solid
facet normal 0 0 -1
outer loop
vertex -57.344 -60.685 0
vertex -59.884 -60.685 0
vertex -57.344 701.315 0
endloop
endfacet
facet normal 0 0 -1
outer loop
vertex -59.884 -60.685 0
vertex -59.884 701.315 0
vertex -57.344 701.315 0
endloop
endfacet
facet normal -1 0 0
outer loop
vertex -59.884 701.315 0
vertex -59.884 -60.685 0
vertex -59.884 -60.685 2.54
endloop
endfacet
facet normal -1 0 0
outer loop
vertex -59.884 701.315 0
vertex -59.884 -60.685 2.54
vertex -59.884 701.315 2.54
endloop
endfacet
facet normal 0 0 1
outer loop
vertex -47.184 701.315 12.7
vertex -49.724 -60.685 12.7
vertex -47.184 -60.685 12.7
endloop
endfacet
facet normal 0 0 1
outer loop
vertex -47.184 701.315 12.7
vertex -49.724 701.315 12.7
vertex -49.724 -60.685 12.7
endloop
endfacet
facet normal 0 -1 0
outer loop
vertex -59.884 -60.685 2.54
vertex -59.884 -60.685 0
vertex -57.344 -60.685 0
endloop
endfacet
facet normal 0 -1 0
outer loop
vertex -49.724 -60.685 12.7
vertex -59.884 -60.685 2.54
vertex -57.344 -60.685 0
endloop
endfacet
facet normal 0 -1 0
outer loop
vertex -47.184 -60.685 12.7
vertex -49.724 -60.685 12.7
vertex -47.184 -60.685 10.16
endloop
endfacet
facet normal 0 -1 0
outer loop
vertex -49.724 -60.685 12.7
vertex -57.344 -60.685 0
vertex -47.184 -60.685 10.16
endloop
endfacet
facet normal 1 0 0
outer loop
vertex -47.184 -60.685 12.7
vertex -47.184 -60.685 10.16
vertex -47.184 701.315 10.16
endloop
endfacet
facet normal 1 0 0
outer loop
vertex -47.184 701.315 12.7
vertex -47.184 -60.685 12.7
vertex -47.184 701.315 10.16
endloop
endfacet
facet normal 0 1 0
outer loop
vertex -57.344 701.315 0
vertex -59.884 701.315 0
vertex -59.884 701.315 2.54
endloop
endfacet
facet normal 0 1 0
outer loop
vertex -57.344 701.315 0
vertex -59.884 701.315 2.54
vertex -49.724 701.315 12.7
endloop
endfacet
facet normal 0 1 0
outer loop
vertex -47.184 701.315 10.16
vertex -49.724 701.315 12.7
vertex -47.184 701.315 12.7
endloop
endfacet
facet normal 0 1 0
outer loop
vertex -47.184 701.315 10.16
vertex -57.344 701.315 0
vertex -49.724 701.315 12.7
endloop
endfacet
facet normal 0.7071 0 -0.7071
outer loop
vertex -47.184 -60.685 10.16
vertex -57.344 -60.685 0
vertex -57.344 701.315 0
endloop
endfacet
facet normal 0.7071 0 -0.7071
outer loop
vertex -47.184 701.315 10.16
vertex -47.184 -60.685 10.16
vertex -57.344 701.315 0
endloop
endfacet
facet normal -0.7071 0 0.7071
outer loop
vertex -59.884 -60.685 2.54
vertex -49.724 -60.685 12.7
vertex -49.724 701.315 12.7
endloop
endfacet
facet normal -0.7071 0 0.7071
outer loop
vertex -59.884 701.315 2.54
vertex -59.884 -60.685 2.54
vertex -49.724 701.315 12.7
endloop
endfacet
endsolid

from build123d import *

# Parameters (mm, degrees)
F0_W     = 12.7
F0_H     = 762
F1_DEPTH = 12.7
F2_SIZE  = 10.16


with BuildPart() as f1:
    # F0 (on Top) → F1 (new body)
    with BuildSketch(Plane.XY):
        with Locations((-53.53354, 320.315027)):
            Rectangle(F0_W, F0_H)
    extrude(amount=F1_DEPTH)

    # F2
    f2_edges = [f1.edges().sort_by_distance(p)[0] for p in [
        (-59.88354, 320.315027, 12.7),
        (-47.18354, 320.315027, 0),
    ]]
    chamfer(f2_edges, length=F2_SIZE)


solid = f1.part
